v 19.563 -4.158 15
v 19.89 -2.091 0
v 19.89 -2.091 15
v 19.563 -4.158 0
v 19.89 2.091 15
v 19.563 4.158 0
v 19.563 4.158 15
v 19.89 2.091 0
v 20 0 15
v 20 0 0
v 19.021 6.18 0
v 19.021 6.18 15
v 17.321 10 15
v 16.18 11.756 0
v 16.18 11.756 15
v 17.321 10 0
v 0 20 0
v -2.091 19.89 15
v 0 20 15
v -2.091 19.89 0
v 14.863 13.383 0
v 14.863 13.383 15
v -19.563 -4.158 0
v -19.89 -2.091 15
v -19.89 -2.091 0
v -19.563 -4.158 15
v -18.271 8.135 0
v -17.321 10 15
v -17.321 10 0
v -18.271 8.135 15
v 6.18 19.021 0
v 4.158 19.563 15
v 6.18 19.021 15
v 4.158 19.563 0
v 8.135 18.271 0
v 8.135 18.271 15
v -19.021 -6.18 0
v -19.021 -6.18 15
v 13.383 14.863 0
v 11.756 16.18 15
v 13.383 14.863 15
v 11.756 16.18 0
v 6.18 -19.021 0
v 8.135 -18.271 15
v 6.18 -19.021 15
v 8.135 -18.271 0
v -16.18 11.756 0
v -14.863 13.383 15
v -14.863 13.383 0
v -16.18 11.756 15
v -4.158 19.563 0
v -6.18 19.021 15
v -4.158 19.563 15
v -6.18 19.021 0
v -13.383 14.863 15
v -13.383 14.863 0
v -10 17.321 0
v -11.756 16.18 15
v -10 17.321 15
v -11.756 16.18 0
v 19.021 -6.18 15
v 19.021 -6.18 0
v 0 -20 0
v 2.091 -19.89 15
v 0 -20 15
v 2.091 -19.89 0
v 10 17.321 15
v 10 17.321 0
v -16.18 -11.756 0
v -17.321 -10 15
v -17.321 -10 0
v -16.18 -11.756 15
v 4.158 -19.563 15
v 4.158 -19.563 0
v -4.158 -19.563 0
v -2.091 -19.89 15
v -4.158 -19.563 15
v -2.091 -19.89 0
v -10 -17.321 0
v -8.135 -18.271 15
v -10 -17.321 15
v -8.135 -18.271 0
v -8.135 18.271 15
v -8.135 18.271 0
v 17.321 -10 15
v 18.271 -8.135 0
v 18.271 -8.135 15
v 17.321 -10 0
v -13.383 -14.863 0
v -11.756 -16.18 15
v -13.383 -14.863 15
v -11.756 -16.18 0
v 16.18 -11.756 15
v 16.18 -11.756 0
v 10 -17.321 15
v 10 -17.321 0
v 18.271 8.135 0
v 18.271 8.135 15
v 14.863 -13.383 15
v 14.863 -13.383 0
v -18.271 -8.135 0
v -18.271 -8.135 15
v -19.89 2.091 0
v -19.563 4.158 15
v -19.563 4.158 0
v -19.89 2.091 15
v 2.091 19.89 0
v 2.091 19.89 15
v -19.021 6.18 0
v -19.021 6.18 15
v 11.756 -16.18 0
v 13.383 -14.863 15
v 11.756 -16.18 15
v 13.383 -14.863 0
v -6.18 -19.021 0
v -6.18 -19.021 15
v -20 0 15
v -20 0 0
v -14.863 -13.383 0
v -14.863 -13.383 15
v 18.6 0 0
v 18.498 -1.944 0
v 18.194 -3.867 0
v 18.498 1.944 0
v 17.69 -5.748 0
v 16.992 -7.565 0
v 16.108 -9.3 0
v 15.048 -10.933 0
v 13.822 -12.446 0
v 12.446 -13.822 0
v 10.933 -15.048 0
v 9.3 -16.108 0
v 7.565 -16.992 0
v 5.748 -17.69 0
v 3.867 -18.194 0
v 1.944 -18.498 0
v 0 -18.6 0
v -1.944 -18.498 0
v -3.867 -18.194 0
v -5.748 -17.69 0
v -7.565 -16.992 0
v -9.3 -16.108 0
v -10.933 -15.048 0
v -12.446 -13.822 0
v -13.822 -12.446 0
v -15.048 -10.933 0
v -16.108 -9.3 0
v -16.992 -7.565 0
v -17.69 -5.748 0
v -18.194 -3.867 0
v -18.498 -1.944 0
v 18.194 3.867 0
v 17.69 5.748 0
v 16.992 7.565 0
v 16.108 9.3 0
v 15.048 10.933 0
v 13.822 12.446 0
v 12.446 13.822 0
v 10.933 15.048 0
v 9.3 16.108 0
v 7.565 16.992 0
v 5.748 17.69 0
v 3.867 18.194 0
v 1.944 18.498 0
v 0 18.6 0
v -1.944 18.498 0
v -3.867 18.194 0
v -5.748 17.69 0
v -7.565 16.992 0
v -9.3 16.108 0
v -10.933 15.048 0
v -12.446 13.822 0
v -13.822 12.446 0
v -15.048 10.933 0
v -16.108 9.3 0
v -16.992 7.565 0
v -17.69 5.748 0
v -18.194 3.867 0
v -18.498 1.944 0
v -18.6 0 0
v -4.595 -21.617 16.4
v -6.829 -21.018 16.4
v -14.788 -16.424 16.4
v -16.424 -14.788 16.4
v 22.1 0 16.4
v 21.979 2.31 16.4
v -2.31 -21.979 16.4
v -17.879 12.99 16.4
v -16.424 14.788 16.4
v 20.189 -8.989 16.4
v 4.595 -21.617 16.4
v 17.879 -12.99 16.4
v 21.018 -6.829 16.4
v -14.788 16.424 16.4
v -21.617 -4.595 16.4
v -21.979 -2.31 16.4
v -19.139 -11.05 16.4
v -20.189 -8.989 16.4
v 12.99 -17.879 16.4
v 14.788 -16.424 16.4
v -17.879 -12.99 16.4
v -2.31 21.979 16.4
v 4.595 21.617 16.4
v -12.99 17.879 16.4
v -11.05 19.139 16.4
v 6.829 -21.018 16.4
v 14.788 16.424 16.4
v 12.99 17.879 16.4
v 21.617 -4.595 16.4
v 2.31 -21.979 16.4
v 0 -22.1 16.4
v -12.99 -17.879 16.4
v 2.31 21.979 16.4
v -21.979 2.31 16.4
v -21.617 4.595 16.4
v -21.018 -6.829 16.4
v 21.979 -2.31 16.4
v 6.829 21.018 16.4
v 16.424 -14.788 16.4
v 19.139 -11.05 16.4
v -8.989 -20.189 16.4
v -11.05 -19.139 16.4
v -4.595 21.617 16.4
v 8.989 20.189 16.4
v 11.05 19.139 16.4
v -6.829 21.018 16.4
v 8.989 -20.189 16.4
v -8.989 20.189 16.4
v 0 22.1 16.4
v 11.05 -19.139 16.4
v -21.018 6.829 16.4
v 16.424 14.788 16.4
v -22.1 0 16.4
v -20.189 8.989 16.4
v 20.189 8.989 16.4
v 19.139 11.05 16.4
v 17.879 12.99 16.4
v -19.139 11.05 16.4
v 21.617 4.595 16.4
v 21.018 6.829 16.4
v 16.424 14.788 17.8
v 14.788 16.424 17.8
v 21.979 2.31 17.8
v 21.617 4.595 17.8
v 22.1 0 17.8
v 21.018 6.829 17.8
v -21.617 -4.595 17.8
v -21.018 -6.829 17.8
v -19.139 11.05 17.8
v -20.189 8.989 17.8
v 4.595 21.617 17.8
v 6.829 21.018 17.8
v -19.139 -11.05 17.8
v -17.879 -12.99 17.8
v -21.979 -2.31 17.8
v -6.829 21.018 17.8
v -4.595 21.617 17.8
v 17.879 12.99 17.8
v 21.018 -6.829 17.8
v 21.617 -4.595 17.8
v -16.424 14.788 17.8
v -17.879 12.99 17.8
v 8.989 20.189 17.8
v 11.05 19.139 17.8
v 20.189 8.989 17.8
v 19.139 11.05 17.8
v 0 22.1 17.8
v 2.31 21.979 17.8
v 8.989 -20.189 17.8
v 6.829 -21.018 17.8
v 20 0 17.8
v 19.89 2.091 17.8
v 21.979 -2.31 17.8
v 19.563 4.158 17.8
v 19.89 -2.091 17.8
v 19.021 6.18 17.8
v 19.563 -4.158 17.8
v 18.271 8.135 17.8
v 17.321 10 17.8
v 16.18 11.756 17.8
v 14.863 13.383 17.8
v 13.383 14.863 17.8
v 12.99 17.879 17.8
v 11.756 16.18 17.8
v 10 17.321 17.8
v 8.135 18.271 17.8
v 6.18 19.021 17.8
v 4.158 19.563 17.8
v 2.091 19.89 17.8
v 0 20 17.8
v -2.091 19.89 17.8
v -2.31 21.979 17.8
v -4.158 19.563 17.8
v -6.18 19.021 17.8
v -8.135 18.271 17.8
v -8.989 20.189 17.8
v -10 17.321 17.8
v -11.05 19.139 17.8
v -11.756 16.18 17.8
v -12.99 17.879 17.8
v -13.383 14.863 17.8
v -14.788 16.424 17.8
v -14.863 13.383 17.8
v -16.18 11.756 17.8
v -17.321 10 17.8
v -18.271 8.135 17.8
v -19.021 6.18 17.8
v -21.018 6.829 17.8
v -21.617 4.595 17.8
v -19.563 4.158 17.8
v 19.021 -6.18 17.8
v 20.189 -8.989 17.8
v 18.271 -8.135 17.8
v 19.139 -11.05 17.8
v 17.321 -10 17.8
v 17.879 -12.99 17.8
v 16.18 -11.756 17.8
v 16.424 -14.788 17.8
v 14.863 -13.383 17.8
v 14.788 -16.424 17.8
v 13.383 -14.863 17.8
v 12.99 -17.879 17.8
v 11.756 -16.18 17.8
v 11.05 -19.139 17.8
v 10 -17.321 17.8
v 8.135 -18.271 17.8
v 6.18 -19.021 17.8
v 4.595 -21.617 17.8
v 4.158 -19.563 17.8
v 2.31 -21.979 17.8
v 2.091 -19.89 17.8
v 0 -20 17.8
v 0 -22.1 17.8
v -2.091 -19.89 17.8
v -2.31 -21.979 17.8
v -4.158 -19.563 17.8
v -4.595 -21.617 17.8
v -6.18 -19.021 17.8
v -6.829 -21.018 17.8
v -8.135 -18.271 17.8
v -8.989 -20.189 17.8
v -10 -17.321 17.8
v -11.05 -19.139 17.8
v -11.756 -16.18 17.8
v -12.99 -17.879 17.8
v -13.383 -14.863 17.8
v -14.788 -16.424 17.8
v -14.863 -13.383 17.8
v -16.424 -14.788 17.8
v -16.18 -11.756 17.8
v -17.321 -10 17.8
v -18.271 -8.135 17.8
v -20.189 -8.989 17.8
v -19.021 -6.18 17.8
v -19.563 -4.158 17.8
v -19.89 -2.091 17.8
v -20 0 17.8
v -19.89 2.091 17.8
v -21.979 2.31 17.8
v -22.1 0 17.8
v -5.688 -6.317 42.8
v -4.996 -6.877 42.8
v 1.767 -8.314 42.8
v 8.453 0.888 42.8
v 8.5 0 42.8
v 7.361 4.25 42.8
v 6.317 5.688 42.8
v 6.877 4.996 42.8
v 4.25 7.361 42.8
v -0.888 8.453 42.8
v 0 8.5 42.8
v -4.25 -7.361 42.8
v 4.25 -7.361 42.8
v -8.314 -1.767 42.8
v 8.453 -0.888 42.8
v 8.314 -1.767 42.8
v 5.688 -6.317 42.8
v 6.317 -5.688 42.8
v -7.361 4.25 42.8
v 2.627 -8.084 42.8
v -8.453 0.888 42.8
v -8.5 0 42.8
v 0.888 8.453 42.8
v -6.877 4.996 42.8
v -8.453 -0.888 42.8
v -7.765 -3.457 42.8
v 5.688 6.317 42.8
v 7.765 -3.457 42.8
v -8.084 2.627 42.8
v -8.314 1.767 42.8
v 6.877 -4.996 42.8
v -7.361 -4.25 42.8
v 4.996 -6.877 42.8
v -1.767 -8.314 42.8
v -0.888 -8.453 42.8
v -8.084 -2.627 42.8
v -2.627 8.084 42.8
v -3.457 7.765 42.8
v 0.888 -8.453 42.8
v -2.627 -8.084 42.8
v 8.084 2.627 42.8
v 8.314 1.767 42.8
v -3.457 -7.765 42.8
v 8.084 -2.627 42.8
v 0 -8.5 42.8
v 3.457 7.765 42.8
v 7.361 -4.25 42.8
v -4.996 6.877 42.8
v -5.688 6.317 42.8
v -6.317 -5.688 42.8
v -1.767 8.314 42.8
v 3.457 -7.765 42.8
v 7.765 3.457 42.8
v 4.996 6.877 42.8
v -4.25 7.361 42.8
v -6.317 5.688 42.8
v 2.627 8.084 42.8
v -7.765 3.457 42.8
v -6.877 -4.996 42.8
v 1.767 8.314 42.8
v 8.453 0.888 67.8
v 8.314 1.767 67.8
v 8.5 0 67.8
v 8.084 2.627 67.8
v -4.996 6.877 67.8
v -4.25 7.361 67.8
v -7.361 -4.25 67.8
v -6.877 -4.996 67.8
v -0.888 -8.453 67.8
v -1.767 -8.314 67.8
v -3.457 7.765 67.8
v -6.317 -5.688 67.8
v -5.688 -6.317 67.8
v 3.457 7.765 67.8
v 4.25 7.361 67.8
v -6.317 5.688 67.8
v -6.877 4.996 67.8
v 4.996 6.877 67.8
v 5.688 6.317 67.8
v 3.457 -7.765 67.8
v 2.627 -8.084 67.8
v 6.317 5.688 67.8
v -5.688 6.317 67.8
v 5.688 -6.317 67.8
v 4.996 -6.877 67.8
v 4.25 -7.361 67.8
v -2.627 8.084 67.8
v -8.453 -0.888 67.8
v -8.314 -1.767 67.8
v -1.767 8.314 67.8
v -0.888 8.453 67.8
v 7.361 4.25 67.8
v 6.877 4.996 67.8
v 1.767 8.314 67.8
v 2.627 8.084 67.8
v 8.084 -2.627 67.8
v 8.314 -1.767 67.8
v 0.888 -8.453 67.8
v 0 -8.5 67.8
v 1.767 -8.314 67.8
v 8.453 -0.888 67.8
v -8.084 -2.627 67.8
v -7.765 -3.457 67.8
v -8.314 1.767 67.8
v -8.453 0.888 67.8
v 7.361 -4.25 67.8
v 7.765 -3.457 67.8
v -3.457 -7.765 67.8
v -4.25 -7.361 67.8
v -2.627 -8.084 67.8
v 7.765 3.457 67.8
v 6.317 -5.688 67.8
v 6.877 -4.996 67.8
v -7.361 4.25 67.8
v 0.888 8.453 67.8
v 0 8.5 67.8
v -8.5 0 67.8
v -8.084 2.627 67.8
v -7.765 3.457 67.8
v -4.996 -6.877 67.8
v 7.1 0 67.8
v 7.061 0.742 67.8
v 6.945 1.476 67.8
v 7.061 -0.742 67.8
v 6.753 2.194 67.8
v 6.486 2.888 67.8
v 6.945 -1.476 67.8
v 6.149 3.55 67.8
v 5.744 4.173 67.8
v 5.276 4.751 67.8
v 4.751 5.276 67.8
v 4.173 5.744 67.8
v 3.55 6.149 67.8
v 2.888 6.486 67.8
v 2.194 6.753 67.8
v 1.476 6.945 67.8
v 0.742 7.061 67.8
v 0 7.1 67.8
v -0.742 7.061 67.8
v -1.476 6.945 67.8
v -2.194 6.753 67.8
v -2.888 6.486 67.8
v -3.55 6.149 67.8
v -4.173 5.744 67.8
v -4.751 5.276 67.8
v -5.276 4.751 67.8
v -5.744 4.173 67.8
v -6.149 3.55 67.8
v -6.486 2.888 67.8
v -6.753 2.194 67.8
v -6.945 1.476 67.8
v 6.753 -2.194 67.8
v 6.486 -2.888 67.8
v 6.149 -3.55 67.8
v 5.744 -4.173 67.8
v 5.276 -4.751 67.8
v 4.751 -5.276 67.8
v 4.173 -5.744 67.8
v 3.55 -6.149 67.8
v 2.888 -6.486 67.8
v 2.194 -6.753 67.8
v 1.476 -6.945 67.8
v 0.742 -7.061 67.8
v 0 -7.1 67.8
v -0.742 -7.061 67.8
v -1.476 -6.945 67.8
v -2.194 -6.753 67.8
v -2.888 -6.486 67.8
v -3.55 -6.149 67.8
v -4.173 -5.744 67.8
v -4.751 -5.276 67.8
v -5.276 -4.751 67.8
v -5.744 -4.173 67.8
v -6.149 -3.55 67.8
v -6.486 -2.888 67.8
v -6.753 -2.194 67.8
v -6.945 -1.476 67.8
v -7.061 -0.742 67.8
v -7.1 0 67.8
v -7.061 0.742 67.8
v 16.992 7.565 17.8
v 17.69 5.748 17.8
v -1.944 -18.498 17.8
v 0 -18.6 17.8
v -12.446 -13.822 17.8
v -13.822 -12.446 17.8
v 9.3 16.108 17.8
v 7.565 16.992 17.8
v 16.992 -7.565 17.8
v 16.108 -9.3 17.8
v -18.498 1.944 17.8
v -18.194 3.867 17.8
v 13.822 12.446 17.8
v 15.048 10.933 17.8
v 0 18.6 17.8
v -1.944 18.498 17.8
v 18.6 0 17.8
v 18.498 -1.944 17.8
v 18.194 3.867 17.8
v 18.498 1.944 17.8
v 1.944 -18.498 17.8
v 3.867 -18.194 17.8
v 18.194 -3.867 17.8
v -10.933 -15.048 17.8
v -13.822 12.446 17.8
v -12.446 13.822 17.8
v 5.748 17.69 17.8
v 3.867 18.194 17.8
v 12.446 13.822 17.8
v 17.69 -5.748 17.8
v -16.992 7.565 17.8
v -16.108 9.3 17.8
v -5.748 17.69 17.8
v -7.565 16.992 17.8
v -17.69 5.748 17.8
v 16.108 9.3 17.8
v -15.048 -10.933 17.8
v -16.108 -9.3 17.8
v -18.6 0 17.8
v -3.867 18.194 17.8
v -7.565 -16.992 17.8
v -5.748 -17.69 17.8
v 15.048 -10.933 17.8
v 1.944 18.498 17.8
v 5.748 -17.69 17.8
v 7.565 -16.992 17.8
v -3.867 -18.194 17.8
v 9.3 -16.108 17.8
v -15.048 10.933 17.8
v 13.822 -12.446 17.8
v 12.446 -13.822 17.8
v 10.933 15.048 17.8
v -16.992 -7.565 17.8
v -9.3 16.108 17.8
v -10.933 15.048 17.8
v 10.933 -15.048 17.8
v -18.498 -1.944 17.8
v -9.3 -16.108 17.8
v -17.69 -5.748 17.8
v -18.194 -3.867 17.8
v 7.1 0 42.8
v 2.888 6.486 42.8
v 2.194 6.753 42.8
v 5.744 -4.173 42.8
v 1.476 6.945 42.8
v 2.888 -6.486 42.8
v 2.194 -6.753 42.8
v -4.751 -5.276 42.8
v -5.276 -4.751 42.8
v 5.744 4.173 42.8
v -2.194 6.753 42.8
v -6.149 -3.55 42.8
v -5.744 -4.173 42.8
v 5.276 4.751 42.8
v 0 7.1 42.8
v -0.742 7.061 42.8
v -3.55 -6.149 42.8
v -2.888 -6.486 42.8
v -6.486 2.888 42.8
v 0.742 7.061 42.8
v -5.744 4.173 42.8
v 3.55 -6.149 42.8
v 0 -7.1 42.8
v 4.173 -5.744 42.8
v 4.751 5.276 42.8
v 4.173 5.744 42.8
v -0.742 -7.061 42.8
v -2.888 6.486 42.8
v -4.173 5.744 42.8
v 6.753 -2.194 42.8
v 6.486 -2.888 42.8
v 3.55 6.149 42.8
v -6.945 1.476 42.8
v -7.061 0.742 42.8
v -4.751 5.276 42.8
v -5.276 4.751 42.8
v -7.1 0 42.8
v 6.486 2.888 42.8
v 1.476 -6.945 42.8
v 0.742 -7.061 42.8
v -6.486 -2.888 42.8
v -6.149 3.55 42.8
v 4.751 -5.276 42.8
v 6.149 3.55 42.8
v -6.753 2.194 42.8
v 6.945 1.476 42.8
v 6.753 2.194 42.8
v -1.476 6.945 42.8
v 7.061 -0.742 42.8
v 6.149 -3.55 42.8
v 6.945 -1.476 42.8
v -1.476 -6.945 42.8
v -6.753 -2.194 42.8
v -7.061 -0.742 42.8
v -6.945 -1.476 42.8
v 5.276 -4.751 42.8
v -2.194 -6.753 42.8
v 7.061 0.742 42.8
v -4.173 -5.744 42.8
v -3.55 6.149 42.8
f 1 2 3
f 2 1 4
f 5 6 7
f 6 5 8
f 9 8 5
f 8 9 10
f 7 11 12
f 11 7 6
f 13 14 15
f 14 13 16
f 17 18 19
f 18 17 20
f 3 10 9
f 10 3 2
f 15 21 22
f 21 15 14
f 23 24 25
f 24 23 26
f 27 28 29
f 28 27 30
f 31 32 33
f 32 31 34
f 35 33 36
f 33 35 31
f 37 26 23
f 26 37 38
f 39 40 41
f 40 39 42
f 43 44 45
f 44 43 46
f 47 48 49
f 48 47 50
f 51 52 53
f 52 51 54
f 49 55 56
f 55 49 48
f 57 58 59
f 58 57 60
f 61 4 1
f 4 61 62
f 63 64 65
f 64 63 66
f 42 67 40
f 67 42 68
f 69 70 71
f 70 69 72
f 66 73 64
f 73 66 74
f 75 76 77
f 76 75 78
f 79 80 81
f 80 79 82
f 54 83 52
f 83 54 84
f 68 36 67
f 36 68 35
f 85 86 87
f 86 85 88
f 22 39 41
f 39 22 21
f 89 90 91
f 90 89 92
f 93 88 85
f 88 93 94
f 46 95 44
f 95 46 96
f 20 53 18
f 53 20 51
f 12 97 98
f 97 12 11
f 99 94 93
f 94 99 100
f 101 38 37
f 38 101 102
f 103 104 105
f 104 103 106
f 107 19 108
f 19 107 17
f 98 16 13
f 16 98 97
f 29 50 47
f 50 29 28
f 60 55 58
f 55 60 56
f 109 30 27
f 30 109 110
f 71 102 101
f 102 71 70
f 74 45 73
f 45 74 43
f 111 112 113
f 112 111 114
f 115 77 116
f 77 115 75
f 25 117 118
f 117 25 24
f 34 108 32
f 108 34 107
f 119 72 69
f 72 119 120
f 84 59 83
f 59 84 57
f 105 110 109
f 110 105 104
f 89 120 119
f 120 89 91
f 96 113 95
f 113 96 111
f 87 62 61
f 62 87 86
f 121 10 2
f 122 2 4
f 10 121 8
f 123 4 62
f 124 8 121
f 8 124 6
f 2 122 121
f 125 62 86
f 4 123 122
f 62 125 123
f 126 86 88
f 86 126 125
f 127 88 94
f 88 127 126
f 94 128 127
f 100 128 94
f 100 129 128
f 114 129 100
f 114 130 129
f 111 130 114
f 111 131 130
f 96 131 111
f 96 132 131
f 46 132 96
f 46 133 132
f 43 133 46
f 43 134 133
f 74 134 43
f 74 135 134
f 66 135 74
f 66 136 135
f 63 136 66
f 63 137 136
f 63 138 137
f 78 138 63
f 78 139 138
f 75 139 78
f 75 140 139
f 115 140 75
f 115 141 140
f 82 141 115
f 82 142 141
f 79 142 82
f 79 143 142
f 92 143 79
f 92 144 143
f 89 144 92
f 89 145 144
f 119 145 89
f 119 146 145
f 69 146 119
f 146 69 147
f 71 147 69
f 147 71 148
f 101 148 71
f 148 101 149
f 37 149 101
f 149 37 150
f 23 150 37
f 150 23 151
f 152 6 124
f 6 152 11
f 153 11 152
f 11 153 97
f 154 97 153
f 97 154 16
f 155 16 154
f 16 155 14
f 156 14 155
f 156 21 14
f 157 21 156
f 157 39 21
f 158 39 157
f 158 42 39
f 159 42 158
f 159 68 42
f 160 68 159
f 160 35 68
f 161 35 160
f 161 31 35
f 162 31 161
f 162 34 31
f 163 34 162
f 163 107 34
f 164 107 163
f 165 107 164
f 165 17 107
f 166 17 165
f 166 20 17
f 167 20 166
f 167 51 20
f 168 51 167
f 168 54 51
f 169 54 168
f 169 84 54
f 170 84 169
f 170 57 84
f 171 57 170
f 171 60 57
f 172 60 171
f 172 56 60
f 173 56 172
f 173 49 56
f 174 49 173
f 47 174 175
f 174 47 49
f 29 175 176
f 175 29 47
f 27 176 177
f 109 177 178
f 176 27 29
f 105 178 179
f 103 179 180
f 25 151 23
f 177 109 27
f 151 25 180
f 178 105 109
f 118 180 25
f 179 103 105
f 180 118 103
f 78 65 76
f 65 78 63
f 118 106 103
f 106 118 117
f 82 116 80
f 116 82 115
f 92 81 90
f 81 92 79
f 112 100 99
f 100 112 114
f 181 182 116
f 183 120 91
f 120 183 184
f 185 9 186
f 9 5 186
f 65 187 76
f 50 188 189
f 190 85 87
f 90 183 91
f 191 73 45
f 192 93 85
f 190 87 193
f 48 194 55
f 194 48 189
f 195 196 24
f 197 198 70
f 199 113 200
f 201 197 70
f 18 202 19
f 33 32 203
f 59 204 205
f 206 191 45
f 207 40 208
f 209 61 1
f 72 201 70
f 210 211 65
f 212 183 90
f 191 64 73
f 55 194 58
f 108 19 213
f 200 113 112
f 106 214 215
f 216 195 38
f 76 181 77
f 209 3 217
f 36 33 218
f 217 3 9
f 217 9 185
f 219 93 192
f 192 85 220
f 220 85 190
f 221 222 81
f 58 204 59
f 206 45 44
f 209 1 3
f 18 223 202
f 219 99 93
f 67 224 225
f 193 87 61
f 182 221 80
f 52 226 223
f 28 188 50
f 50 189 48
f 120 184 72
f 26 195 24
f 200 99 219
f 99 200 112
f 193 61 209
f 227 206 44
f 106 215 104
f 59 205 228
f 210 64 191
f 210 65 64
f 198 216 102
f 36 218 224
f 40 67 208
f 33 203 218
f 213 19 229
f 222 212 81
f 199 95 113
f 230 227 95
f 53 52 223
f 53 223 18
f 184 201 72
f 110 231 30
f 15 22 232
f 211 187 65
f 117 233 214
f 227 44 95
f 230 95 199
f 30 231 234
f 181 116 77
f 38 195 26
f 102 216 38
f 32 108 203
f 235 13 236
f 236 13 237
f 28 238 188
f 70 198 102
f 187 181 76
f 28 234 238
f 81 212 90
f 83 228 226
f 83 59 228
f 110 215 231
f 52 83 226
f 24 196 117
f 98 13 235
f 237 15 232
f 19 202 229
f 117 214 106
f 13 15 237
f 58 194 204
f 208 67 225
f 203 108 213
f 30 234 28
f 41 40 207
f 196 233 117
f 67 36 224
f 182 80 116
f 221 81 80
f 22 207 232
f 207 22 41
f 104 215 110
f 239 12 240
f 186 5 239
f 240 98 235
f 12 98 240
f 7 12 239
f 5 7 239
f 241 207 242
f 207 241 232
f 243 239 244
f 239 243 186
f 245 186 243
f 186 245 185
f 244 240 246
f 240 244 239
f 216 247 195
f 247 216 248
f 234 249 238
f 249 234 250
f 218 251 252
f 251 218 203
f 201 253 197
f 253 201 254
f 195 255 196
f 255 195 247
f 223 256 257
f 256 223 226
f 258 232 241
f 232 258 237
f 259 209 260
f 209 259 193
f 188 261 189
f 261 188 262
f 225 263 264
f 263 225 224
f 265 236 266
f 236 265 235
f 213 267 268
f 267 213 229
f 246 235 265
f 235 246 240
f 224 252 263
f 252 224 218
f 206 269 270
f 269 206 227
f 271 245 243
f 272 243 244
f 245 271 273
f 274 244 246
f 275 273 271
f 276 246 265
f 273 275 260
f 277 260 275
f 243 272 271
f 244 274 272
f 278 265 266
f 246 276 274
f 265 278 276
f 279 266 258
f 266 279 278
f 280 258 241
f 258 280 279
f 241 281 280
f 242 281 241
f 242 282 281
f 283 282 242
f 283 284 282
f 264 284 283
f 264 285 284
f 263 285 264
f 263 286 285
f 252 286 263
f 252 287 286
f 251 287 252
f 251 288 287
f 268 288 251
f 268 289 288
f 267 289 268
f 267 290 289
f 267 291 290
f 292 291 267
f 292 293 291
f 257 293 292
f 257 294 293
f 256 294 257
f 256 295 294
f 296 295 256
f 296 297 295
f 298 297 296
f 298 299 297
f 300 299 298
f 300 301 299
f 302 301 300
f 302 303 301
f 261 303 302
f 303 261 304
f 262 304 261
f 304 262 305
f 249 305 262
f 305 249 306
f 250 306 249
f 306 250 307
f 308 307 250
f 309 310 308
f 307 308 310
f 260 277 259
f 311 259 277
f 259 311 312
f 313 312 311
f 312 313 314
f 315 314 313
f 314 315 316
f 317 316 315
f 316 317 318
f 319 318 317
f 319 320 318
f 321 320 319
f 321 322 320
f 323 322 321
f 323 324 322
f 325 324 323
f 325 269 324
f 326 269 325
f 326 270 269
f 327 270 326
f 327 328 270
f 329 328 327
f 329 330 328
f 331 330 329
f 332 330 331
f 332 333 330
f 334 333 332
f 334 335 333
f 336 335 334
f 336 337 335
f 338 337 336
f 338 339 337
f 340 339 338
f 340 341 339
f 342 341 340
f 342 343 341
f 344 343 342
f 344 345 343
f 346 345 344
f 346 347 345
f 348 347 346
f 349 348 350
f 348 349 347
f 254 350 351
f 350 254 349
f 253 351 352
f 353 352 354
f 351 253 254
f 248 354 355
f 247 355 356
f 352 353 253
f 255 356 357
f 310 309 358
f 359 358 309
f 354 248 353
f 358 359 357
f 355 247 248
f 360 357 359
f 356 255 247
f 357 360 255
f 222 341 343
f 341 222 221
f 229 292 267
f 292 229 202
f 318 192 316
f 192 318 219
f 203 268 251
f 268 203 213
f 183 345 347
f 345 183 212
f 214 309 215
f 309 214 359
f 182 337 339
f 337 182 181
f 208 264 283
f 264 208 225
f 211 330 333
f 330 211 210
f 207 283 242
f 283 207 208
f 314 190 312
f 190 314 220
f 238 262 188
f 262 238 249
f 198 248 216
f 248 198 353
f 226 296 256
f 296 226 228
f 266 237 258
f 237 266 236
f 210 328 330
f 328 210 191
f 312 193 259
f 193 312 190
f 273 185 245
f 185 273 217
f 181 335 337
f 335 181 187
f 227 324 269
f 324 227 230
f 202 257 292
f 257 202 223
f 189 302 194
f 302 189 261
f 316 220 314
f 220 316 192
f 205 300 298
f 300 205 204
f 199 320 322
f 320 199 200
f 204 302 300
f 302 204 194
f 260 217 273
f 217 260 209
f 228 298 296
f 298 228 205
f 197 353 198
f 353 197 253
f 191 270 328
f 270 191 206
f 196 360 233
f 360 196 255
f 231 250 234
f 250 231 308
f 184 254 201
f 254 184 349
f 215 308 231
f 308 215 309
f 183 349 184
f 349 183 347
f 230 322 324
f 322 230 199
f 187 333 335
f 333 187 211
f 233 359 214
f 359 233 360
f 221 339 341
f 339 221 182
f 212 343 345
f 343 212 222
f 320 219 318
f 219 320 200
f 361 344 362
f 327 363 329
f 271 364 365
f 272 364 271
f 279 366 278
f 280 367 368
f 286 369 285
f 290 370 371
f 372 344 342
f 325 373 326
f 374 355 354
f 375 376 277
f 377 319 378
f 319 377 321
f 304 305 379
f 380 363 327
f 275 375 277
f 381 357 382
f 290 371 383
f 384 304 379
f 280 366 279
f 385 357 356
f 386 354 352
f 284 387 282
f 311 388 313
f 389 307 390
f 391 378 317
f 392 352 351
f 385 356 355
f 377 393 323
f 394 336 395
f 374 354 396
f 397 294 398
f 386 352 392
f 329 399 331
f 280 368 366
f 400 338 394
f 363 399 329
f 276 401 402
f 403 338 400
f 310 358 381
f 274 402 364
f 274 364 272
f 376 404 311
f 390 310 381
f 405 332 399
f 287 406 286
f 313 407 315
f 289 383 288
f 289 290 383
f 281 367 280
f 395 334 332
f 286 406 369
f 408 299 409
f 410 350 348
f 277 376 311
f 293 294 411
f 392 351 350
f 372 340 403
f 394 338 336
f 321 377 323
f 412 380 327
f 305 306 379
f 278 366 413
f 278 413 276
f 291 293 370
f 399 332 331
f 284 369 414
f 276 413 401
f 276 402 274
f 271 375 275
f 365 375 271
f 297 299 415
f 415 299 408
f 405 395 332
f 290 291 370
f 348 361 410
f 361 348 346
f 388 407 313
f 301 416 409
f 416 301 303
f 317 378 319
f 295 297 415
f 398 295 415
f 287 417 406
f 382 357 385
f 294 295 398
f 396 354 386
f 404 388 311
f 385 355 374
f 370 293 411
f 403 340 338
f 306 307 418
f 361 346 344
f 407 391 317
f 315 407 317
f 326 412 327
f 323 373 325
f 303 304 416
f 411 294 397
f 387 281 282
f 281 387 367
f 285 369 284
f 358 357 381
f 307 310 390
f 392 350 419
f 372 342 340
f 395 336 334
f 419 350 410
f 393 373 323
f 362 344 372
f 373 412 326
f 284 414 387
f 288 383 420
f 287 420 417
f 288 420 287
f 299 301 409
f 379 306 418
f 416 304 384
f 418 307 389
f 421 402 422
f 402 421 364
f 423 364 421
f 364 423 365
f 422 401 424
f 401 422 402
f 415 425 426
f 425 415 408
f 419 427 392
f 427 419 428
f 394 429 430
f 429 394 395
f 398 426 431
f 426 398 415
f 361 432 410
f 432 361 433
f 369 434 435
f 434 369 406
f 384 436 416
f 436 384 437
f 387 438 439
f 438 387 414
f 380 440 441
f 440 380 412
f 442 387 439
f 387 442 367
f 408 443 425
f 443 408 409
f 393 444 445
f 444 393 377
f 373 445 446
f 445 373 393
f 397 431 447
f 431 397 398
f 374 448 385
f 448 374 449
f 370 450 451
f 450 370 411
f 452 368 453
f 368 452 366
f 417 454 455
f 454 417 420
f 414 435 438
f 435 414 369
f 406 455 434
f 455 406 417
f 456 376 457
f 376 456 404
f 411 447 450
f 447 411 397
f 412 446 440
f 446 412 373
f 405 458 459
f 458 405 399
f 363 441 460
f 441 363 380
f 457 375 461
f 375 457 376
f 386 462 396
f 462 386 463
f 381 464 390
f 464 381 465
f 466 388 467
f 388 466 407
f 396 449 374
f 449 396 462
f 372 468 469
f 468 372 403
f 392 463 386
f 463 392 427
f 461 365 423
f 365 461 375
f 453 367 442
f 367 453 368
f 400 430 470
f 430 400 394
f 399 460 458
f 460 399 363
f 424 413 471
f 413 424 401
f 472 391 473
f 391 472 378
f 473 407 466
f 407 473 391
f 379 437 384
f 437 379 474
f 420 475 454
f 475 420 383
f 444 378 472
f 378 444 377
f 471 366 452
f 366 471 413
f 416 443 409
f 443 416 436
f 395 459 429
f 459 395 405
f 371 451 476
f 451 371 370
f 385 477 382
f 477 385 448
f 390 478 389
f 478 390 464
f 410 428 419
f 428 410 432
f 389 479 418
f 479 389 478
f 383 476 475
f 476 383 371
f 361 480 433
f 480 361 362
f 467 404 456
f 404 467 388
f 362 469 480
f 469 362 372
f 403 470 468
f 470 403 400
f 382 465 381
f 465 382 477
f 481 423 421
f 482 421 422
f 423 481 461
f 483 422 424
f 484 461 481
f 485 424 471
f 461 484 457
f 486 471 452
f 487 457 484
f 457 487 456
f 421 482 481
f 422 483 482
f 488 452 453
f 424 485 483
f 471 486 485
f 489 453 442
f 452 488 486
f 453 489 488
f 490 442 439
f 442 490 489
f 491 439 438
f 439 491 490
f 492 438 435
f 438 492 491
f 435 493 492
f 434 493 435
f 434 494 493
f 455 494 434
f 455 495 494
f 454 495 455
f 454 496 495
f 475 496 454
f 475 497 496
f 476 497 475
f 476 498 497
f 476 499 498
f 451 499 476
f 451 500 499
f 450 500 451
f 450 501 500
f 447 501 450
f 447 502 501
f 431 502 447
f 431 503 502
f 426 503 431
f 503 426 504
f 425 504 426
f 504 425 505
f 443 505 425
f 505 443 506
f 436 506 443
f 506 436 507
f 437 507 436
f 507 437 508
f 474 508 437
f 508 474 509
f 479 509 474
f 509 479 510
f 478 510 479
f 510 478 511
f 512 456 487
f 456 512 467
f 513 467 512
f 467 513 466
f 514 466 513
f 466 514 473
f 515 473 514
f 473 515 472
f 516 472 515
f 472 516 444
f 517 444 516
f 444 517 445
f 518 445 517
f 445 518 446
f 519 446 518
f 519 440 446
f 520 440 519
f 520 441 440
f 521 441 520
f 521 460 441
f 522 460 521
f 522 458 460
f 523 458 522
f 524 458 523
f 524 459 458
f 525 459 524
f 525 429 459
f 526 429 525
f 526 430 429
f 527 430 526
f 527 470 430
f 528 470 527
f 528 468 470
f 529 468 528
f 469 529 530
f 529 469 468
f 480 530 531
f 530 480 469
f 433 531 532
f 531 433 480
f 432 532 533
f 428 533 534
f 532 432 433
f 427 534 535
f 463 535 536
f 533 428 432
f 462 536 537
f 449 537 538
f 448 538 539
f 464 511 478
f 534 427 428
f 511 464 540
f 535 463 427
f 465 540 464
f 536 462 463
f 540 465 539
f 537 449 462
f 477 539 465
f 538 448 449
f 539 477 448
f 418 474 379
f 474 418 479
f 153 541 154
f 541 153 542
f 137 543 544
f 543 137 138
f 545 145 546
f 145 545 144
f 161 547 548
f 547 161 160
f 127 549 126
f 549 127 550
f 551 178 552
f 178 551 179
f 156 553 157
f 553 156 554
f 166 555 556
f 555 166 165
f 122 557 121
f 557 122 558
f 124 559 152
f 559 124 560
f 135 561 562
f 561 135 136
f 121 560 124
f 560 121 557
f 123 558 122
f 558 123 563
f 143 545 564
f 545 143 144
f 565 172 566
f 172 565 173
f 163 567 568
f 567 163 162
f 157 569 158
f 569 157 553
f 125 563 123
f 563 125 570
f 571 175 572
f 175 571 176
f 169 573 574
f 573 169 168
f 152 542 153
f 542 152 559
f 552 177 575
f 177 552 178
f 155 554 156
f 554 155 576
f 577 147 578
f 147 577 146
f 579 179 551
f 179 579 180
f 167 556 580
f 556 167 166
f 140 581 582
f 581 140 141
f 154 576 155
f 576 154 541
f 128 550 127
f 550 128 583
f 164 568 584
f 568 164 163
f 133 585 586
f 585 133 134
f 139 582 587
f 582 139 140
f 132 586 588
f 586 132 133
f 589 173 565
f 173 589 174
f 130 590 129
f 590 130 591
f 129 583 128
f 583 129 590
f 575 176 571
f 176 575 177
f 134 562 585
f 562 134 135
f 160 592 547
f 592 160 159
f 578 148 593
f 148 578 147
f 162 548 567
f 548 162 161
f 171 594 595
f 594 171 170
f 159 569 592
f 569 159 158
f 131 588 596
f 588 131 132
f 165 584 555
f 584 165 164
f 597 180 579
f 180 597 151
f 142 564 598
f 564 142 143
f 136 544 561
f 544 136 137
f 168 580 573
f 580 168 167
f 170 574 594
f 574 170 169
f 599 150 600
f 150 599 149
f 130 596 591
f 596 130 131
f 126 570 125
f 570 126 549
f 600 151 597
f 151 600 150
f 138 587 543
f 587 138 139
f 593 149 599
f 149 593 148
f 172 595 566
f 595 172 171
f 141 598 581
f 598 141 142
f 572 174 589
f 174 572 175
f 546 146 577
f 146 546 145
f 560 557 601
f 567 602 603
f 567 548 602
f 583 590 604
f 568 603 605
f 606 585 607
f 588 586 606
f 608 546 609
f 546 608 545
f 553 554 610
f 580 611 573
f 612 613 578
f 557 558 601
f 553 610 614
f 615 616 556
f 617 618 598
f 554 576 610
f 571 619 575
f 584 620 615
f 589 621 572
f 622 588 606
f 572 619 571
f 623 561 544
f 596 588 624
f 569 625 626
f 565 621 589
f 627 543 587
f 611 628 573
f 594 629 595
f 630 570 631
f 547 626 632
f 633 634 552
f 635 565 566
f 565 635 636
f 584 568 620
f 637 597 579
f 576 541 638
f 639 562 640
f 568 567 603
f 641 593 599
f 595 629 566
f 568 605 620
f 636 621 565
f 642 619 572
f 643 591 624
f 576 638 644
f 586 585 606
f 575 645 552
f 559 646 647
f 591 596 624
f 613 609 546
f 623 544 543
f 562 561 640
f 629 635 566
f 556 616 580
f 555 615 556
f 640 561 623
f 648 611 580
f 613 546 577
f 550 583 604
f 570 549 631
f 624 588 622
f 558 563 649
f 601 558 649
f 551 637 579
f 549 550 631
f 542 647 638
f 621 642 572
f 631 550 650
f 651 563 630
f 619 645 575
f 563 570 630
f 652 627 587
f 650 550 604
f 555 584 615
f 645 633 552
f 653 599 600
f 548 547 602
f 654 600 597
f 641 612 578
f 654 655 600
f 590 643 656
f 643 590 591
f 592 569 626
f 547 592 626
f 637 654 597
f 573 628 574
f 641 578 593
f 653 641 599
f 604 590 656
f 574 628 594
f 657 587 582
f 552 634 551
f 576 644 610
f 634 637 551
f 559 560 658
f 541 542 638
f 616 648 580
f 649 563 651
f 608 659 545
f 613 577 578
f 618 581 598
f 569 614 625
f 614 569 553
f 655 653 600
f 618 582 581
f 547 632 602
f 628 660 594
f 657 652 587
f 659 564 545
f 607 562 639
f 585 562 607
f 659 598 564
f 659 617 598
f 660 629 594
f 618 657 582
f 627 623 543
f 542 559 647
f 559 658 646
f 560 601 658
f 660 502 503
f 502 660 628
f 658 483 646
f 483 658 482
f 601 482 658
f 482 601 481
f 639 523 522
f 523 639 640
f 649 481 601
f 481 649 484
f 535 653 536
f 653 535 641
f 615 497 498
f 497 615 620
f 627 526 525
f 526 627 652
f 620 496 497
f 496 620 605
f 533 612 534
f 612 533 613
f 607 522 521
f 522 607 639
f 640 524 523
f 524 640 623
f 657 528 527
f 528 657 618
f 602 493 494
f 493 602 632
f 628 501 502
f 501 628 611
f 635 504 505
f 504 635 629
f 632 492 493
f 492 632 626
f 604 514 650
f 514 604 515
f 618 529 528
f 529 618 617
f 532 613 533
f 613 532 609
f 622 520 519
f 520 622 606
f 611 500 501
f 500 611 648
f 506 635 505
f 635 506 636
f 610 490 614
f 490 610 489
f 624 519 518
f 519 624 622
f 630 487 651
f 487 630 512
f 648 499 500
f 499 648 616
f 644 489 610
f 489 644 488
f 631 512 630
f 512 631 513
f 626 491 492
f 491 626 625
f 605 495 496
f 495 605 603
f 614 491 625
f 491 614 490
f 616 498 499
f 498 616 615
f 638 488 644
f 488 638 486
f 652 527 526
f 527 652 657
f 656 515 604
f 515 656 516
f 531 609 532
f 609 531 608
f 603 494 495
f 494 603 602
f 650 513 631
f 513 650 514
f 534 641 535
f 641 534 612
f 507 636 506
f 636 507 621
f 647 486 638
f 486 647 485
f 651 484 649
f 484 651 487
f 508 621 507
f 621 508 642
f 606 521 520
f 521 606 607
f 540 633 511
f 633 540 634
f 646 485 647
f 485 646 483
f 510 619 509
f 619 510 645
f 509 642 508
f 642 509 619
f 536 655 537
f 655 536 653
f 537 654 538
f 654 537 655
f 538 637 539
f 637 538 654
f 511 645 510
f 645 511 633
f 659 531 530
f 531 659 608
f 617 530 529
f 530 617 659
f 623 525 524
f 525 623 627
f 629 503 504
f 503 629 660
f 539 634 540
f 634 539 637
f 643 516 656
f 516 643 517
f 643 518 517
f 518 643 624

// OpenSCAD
//FollyMaker
//Vacuum Hose Adapter Beta 0.2 Testing
//Gather the parameters
/* [Parameters] */

//--Example is ShopVac Nominal 2.5" machine port to 1.5" accessory.  -- For the large end, is the measurement the adapter's outside or inside diameter?
LargeEndMeasured = "outside"; //[outside, inside]
//Diameter of Large End? (mm)
LargeEndDiameter = 40;
// Length of Large End? (mm)
LargeEndLength = 15;
//For the small end, is the measurement the adapter's outside or inside diameter?
SmallEndMeasured = "outside"; //[outside, inside]
//Diameter of Small End? (mm)
SmallEndDiameter = 17;
// Length of Small End? (mm)
SmallEndLength = 25;
// Length of Taper Section? (mm)
TaperLength = 25;
 // Create an Inside Stop at the lower end of smaller end of this adapter? (To keep the connected fitting from being sucked in.)
 InsideStop= "no"; //[no,yes]
 //What is the thickness of the adapter's walls?
 WallThickness = 1.4;
 
 $fn=60 *1;
 
     WT=WallThickness;
     LL=LargeEndLength;
     SL=SmallEndLength;
     TL=TaperLength;
     
     LD=  LargeEndMeasured =="inside" ? LargeEndDiameter + 2*WT : LargeEndDiameter;
     SD=  SmallEndMeasured =="inside" ? SmallEndDiameter + 2*WT : SmallEndDiameter;
     LID=  LargeEndMeasured =="inside" ? LD : LD - 2*WT;
     SID=  SmallEndMeasured =="inside" ? SD : SD - 2*WT;
     LID = LD - 2*WT;
     SID = SD - 2*WT;
     DR = LD + 3*WT;
     
 
module TransCylinder(D1, D2, H, Z)
    {
        translate([0, 0, Z])
        {
            cylinder(d1=D1, d2=D2, h=H, center=false);
        }
    }
   
difference()
{
      union()
        { 
            TransCylinder(LD, LD, LL, 0);
            TransCylinder(LD, DR, WT, LL);
            TransCylinder(DR, DR, WT, LL + WT);
            TransCylinder(LD, SD, TL, LL + 2*WT);
            TransCylinder(SD, SD, SL, LL + TL + 2*WT);
          } 
     union()
        {
            TransCylinder(LID, LID, LL, 0);
            TransCylinder(LID, LID, WT, LL);
            TransCylinder(LID, LID,  WT, LL + WT);
            TransCylinder(LID, SID, TL, LL + 2*WT);
            if (InsideStop=="yes")
                {
                TransCylinder(SID, SID-(2*WT), WT, LL +TL + 2*WT);
                TransCylinder(SID, SID, SL, LL +TL + 3*WT);
                    }
                else
                    {          
                    TransCylinder(SID, SID, SL, LL +TL + 2*WT);
                    }
        }
}   
